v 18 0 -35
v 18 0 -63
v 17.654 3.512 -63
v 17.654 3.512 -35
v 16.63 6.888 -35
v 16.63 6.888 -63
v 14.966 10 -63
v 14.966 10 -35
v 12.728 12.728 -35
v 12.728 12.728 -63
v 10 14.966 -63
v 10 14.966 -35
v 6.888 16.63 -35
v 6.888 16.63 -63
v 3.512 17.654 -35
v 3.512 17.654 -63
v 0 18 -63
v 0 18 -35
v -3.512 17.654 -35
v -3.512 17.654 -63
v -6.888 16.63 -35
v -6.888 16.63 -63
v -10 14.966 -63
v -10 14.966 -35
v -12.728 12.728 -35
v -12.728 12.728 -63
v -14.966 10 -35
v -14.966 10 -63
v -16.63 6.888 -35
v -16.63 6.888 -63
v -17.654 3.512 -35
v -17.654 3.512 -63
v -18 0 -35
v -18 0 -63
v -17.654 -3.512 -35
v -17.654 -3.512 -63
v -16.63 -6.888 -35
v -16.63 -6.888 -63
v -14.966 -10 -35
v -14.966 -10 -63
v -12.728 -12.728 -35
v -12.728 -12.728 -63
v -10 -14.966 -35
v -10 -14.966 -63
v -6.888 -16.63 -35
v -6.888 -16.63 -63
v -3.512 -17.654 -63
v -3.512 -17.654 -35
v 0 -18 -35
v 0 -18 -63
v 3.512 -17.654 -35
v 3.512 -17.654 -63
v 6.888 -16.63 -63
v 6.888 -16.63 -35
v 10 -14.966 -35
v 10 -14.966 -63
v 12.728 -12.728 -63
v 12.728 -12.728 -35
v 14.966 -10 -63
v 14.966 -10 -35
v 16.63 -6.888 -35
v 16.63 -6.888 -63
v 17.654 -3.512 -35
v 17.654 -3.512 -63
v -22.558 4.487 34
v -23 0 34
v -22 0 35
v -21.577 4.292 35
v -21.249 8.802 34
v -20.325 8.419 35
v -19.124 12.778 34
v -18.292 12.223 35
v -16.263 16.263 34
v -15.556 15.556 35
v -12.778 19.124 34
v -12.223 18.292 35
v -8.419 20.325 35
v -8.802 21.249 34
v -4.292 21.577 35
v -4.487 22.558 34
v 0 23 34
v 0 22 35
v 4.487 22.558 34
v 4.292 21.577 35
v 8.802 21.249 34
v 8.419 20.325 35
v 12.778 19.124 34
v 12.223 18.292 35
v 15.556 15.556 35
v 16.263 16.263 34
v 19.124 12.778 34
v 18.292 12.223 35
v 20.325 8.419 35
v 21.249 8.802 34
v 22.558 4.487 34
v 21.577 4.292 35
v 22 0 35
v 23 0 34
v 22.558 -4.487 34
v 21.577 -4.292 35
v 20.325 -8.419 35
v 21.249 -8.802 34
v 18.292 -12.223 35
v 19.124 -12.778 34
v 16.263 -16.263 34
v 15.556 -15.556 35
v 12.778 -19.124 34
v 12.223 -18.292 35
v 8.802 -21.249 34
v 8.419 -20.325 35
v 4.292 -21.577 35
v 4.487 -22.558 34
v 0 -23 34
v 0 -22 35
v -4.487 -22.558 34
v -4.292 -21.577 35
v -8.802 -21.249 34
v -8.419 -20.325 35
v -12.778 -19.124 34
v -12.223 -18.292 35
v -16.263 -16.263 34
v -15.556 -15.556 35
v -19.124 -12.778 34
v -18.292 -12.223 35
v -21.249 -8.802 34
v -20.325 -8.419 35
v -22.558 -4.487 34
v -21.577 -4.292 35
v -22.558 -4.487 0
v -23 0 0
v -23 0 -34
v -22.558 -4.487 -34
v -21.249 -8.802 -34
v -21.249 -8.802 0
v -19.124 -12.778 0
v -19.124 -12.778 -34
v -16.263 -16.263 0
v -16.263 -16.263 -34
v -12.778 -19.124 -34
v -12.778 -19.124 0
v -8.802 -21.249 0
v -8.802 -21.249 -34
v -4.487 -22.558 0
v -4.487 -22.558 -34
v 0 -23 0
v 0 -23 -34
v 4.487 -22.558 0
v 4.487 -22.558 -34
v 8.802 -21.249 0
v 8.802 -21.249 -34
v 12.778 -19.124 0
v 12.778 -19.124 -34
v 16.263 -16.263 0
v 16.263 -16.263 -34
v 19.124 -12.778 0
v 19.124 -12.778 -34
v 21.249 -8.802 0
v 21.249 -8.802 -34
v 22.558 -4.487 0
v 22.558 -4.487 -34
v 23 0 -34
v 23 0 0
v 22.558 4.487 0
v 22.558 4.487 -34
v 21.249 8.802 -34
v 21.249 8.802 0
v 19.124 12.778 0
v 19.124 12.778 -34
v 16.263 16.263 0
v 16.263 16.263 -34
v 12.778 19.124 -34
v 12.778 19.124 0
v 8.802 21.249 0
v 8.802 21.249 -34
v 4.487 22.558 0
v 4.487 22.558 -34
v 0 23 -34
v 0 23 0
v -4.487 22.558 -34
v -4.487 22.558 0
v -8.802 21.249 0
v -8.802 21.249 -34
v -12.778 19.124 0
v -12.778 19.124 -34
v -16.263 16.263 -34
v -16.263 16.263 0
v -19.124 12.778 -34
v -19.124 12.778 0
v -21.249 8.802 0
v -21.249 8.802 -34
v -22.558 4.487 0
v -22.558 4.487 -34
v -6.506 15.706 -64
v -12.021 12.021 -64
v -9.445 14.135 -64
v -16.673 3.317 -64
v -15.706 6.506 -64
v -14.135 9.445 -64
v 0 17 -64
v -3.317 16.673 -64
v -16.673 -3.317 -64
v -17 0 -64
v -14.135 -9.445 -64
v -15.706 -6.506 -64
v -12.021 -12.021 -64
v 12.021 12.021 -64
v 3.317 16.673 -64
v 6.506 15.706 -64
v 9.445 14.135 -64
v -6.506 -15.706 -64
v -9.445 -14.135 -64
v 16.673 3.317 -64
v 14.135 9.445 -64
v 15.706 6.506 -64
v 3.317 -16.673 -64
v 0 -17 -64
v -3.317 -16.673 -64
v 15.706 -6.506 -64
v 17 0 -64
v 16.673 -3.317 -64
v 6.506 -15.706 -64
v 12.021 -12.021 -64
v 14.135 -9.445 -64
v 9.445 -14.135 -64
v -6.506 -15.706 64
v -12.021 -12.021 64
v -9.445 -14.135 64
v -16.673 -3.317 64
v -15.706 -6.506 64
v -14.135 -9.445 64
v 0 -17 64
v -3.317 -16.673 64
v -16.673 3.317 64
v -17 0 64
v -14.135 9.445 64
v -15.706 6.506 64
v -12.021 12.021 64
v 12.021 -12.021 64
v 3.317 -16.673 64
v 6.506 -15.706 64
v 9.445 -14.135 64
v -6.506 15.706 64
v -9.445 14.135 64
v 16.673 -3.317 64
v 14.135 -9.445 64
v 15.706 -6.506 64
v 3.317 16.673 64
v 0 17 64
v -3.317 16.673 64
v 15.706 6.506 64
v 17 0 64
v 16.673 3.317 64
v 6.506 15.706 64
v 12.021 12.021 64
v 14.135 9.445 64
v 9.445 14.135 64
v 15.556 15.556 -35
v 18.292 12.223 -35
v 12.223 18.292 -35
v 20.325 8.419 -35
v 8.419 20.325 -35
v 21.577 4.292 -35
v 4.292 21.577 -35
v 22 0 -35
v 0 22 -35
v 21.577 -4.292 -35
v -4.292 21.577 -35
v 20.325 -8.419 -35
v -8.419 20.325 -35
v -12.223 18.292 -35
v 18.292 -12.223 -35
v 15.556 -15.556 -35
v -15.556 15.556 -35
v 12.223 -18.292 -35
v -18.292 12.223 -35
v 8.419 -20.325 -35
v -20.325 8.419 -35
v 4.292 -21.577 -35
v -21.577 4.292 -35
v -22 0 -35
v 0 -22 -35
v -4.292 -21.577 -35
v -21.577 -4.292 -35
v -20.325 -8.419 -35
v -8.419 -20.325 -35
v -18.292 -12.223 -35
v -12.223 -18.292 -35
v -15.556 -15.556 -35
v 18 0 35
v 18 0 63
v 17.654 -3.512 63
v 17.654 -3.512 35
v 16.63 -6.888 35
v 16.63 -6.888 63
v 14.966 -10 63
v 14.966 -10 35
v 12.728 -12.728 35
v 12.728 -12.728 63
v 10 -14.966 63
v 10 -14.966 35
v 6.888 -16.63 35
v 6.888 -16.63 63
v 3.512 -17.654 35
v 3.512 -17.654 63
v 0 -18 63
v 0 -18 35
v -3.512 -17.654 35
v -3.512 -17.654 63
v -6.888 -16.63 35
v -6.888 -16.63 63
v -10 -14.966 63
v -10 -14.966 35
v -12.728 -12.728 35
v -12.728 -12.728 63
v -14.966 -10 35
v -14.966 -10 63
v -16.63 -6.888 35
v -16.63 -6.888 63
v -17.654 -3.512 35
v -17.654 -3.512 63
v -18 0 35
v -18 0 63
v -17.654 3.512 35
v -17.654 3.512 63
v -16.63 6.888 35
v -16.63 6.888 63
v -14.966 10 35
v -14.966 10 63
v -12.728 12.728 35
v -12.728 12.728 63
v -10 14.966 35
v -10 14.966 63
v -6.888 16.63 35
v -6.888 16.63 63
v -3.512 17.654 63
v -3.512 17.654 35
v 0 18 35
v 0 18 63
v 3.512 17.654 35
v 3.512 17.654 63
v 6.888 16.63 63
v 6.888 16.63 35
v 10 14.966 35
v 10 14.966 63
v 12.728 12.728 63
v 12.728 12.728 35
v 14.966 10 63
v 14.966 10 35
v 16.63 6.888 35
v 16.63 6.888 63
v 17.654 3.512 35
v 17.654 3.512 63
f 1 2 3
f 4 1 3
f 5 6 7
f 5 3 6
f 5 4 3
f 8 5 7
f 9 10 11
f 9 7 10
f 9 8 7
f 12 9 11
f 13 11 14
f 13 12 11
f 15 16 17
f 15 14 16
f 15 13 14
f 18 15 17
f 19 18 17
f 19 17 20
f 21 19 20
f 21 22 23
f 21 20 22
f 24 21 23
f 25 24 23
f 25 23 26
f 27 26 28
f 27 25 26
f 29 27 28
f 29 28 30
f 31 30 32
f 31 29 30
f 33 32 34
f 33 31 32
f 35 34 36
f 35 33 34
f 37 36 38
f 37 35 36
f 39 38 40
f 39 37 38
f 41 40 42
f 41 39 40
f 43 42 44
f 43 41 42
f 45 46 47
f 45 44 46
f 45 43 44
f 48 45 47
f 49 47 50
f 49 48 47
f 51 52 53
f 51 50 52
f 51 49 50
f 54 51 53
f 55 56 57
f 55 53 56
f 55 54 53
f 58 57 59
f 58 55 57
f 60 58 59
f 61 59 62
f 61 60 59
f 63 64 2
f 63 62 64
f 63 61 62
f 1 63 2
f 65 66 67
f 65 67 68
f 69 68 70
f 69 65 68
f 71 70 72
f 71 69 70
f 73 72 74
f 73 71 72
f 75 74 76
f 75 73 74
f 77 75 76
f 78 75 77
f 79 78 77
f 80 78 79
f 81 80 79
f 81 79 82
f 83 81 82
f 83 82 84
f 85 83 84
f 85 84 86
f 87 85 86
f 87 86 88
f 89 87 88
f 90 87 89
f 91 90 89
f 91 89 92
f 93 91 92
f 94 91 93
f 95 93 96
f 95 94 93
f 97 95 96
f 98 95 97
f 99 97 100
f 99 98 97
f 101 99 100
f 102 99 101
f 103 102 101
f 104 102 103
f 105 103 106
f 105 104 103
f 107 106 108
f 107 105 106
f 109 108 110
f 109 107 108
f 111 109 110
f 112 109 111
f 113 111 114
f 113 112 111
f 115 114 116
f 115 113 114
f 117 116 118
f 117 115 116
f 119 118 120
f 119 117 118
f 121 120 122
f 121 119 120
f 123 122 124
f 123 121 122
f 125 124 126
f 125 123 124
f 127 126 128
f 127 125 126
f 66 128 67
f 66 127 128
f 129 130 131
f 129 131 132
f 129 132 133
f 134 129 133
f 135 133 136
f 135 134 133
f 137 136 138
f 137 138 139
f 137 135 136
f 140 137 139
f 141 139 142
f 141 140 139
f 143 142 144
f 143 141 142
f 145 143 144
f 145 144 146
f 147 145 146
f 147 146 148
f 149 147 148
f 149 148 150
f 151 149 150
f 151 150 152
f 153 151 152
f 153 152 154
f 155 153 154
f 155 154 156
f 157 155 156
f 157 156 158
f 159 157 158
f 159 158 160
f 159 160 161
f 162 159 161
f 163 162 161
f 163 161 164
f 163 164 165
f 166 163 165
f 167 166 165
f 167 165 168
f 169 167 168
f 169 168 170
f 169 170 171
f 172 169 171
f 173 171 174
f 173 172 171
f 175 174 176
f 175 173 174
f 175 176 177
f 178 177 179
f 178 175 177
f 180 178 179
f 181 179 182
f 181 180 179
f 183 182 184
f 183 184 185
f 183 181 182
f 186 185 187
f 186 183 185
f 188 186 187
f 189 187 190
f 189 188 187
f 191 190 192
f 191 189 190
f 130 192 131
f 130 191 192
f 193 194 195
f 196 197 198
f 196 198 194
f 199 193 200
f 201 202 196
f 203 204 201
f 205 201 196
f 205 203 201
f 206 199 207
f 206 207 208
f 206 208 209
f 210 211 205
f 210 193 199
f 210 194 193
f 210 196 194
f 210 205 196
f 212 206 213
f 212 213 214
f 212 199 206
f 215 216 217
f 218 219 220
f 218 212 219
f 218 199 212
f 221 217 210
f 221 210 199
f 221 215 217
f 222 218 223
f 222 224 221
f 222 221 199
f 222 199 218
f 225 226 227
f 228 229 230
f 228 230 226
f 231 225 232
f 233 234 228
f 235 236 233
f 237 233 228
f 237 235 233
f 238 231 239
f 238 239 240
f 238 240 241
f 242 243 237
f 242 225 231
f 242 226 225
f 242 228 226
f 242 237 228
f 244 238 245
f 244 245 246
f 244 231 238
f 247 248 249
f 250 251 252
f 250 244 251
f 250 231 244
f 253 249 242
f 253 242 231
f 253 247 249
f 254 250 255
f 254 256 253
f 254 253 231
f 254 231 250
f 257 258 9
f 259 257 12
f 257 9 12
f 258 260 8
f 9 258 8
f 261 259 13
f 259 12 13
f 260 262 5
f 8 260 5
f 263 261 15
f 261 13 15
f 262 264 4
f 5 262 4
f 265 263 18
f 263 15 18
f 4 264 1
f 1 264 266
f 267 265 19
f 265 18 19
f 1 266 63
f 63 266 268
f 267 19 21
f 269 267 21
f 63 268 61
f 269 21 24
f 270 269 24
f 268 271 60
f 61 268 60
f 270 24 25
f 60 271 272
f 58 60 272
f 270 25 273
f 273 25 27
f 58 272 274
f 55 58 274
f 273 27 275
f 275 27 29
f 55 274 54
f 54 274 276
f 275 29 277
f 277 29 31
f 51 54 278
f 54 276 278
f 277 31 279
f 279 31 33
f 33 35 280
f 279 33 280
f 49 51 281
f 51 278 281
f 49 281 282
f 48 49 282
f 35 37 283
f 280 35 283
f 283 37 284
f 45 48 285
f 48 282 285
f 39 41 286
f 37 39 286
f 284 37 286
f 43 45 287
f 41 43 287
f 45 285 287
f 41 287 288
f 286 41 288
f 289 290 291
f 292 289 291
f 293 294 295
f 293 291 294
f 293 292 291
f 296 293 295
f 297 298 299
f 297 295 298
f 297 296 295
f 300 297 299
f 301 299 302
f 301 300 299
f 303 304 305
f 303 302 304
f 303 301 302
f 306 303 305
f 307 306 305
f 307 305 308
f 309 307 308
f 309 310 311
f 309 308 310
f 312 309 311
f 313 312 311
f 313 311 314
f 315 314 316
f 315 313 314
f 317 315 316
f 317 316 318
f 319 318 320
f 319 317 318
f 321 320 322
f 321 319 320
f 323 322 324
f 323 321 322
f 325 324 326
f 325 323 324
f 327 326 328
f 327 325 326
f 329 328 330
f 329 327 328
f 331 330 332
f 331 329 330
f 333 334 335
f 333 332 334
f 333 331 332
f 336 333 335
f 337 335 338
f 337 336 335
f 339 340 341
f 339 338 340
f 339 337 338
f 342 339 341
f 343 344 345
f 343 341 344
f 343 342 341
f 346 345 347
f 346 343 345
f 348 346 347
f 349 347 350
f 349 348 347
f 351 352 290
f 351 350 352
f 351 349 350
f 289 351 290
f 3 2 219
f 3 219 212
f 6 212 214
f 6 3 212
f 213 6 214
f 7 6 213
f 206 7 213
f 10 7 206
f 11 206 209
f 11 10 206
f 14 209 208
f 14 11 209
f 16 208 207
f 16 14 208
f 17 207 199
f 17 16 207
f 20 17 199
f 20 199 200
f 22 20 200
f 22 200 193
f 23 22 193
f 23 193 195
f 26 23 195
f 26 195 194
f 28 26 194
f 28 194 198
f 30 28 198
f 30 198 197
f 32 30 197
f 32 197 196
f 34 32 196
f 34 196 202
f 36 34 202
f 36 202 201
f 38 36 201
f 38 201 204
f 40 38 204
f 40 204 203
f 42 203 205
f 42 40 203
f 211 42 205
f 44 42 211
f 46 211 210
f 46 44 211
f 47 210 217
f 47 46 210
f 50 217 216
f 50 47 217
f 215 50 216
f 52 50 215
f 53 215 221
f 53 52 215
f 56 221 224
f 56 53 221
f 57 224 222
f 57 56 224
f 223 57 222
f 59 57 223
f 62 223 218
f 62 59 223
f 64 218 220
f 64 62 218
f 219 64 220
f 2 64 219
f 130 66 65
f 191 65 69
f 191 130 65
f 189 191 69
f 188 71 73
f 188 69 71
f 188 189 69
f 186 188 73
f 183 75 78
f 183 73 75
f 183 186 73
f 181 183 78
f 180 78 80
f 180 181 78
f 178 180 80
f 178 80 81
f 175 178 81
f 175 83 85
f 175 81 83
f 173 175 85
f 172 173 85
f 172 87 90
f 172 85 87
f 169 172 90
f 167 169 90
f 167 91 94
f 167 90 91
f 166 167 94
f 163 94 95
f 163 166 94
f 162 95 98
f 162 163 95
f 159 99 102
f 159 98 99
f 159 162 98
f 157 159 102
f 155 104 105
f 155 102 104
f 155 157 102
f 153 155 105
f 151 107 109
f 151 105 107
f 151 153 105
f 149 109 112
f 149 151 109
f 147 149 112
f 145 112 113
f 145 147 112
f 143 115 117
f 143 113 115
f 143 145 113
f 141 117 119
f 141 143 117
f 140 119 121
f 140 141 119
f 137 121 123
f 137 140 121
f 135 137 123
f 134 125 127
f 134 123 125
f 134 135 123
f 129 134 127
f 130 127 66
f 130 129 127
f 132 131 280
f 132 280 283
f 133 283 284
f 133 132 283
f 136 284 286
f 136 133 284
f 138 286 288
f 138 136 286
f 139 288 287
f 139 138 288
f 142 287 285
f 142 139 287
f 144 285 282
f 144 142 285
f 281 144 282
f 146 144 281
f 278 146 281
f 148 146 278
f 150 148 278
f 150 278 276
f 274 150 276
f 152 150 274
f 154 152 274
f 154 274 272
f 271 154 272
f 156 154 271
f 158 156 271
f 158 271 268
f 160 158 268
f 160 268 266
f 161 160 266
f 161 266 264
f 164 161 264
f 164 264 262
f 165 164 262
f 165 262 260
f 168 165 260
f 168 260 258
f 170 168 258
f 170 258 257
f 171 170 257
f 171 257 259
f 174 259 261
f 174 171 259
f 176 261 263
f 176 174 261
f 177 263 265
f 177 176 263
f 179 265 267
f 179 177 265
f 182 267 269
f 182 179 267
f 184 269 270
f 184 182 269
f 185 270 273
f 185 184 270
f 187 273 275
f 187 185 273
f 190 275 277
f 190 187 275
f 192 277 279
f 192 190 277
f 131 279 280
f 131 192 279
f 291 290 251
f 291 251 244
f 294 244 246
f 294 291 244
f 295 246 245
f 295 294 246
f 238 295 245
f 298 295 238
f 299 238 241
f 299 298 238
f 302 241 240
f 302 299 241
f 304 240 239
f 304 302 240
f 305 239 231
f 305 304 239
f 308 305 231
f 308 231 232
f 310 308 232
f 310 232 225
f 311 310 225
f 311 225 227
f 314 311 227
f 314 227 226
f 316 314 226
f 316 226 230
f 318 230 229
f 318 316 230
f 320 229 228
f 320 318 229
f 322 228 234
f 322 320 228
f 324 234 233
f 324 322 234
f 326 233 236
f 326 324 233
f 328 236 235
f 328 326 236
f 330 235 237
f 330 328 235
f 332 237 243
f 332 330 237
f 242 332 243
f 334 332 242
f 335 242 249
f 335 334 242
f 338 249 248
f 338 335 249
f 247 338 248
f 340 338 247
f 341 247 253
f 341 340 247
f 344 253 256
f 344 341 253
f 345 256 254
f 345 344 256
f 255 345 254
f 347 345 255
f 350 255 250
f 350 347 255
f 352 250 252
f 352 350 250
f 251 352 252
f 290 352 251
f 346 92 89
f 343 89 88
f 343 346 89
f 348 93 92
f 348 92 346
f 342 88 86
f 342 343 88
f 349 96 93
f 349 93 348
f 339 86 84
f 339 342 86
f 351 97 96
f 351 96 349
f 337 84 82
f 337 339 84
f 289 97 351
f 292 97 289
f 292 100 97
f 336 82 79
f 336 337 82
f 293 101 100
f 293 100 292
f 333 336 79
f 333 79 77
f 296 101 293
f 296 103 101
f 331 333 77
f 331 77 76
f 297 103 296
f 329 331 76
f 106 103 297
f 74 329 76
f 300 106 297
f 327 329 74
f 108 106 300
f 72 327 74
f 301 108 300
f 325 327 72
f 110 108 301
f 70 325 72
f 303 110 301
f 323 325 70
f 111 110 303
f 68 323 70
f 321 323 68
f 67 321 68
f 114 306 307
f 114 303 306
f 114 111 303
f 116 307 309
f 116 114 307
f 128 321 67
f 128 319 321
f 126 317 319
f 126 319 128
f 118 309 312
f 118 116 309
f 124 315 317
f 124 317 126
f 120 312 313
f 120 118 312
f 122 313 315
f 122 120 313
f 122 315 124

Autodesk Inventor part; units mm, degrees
ref_plane "YZ Plane" through (0, 0, 0) normal (1, 0, 0) x (0, 1, 0)
ref_plane "XZ Plane" through (0, 0, 0) normal (0, 1, 0) x (-1, 0, 0)
ref_plane "XY Plane" through (0, 0, 0) normal (0, 0, 1) x (1, 0, 0)
sketch "Esboço1" plane through (0, 0, 0) normal (0, 0, 1) x (-1, 0, 0)
  circle A0 centre (0, 0) radius 23
  dimension "d0" = 46
extrude "Extrusão1" add sketch "Esboço1" along normal mid plane 70
sketch "Esboço2" plane through (0, 0, -35) normal (0, 0, -1) x (1, 0, 0)
  circle A0 centre (0, 0) radius 18
  dimension "d3" = 36
extrude "Extrusão2" add sketch "Esboço2" along normal blind 29
sketch "Esboço3" plane through (0, 0, 35) normal (0, 0, 1) x (1, 0, 0)
  circle A0 centre (0, 0) radius 18
  dimension "d6" = 36
extrude "Extrusão3" add sketch "Esboço3" along normal blind 29
chamfer "Chanfro1" distance 1 angle 45 1 edges at (-18, 0, -64)
chamfer "Chanfro2" distance 1 angle 45 3 edges at (23, 0, -35) (23, 0, 35) (-18, 0, 64)
properties material "Liga de aço"
